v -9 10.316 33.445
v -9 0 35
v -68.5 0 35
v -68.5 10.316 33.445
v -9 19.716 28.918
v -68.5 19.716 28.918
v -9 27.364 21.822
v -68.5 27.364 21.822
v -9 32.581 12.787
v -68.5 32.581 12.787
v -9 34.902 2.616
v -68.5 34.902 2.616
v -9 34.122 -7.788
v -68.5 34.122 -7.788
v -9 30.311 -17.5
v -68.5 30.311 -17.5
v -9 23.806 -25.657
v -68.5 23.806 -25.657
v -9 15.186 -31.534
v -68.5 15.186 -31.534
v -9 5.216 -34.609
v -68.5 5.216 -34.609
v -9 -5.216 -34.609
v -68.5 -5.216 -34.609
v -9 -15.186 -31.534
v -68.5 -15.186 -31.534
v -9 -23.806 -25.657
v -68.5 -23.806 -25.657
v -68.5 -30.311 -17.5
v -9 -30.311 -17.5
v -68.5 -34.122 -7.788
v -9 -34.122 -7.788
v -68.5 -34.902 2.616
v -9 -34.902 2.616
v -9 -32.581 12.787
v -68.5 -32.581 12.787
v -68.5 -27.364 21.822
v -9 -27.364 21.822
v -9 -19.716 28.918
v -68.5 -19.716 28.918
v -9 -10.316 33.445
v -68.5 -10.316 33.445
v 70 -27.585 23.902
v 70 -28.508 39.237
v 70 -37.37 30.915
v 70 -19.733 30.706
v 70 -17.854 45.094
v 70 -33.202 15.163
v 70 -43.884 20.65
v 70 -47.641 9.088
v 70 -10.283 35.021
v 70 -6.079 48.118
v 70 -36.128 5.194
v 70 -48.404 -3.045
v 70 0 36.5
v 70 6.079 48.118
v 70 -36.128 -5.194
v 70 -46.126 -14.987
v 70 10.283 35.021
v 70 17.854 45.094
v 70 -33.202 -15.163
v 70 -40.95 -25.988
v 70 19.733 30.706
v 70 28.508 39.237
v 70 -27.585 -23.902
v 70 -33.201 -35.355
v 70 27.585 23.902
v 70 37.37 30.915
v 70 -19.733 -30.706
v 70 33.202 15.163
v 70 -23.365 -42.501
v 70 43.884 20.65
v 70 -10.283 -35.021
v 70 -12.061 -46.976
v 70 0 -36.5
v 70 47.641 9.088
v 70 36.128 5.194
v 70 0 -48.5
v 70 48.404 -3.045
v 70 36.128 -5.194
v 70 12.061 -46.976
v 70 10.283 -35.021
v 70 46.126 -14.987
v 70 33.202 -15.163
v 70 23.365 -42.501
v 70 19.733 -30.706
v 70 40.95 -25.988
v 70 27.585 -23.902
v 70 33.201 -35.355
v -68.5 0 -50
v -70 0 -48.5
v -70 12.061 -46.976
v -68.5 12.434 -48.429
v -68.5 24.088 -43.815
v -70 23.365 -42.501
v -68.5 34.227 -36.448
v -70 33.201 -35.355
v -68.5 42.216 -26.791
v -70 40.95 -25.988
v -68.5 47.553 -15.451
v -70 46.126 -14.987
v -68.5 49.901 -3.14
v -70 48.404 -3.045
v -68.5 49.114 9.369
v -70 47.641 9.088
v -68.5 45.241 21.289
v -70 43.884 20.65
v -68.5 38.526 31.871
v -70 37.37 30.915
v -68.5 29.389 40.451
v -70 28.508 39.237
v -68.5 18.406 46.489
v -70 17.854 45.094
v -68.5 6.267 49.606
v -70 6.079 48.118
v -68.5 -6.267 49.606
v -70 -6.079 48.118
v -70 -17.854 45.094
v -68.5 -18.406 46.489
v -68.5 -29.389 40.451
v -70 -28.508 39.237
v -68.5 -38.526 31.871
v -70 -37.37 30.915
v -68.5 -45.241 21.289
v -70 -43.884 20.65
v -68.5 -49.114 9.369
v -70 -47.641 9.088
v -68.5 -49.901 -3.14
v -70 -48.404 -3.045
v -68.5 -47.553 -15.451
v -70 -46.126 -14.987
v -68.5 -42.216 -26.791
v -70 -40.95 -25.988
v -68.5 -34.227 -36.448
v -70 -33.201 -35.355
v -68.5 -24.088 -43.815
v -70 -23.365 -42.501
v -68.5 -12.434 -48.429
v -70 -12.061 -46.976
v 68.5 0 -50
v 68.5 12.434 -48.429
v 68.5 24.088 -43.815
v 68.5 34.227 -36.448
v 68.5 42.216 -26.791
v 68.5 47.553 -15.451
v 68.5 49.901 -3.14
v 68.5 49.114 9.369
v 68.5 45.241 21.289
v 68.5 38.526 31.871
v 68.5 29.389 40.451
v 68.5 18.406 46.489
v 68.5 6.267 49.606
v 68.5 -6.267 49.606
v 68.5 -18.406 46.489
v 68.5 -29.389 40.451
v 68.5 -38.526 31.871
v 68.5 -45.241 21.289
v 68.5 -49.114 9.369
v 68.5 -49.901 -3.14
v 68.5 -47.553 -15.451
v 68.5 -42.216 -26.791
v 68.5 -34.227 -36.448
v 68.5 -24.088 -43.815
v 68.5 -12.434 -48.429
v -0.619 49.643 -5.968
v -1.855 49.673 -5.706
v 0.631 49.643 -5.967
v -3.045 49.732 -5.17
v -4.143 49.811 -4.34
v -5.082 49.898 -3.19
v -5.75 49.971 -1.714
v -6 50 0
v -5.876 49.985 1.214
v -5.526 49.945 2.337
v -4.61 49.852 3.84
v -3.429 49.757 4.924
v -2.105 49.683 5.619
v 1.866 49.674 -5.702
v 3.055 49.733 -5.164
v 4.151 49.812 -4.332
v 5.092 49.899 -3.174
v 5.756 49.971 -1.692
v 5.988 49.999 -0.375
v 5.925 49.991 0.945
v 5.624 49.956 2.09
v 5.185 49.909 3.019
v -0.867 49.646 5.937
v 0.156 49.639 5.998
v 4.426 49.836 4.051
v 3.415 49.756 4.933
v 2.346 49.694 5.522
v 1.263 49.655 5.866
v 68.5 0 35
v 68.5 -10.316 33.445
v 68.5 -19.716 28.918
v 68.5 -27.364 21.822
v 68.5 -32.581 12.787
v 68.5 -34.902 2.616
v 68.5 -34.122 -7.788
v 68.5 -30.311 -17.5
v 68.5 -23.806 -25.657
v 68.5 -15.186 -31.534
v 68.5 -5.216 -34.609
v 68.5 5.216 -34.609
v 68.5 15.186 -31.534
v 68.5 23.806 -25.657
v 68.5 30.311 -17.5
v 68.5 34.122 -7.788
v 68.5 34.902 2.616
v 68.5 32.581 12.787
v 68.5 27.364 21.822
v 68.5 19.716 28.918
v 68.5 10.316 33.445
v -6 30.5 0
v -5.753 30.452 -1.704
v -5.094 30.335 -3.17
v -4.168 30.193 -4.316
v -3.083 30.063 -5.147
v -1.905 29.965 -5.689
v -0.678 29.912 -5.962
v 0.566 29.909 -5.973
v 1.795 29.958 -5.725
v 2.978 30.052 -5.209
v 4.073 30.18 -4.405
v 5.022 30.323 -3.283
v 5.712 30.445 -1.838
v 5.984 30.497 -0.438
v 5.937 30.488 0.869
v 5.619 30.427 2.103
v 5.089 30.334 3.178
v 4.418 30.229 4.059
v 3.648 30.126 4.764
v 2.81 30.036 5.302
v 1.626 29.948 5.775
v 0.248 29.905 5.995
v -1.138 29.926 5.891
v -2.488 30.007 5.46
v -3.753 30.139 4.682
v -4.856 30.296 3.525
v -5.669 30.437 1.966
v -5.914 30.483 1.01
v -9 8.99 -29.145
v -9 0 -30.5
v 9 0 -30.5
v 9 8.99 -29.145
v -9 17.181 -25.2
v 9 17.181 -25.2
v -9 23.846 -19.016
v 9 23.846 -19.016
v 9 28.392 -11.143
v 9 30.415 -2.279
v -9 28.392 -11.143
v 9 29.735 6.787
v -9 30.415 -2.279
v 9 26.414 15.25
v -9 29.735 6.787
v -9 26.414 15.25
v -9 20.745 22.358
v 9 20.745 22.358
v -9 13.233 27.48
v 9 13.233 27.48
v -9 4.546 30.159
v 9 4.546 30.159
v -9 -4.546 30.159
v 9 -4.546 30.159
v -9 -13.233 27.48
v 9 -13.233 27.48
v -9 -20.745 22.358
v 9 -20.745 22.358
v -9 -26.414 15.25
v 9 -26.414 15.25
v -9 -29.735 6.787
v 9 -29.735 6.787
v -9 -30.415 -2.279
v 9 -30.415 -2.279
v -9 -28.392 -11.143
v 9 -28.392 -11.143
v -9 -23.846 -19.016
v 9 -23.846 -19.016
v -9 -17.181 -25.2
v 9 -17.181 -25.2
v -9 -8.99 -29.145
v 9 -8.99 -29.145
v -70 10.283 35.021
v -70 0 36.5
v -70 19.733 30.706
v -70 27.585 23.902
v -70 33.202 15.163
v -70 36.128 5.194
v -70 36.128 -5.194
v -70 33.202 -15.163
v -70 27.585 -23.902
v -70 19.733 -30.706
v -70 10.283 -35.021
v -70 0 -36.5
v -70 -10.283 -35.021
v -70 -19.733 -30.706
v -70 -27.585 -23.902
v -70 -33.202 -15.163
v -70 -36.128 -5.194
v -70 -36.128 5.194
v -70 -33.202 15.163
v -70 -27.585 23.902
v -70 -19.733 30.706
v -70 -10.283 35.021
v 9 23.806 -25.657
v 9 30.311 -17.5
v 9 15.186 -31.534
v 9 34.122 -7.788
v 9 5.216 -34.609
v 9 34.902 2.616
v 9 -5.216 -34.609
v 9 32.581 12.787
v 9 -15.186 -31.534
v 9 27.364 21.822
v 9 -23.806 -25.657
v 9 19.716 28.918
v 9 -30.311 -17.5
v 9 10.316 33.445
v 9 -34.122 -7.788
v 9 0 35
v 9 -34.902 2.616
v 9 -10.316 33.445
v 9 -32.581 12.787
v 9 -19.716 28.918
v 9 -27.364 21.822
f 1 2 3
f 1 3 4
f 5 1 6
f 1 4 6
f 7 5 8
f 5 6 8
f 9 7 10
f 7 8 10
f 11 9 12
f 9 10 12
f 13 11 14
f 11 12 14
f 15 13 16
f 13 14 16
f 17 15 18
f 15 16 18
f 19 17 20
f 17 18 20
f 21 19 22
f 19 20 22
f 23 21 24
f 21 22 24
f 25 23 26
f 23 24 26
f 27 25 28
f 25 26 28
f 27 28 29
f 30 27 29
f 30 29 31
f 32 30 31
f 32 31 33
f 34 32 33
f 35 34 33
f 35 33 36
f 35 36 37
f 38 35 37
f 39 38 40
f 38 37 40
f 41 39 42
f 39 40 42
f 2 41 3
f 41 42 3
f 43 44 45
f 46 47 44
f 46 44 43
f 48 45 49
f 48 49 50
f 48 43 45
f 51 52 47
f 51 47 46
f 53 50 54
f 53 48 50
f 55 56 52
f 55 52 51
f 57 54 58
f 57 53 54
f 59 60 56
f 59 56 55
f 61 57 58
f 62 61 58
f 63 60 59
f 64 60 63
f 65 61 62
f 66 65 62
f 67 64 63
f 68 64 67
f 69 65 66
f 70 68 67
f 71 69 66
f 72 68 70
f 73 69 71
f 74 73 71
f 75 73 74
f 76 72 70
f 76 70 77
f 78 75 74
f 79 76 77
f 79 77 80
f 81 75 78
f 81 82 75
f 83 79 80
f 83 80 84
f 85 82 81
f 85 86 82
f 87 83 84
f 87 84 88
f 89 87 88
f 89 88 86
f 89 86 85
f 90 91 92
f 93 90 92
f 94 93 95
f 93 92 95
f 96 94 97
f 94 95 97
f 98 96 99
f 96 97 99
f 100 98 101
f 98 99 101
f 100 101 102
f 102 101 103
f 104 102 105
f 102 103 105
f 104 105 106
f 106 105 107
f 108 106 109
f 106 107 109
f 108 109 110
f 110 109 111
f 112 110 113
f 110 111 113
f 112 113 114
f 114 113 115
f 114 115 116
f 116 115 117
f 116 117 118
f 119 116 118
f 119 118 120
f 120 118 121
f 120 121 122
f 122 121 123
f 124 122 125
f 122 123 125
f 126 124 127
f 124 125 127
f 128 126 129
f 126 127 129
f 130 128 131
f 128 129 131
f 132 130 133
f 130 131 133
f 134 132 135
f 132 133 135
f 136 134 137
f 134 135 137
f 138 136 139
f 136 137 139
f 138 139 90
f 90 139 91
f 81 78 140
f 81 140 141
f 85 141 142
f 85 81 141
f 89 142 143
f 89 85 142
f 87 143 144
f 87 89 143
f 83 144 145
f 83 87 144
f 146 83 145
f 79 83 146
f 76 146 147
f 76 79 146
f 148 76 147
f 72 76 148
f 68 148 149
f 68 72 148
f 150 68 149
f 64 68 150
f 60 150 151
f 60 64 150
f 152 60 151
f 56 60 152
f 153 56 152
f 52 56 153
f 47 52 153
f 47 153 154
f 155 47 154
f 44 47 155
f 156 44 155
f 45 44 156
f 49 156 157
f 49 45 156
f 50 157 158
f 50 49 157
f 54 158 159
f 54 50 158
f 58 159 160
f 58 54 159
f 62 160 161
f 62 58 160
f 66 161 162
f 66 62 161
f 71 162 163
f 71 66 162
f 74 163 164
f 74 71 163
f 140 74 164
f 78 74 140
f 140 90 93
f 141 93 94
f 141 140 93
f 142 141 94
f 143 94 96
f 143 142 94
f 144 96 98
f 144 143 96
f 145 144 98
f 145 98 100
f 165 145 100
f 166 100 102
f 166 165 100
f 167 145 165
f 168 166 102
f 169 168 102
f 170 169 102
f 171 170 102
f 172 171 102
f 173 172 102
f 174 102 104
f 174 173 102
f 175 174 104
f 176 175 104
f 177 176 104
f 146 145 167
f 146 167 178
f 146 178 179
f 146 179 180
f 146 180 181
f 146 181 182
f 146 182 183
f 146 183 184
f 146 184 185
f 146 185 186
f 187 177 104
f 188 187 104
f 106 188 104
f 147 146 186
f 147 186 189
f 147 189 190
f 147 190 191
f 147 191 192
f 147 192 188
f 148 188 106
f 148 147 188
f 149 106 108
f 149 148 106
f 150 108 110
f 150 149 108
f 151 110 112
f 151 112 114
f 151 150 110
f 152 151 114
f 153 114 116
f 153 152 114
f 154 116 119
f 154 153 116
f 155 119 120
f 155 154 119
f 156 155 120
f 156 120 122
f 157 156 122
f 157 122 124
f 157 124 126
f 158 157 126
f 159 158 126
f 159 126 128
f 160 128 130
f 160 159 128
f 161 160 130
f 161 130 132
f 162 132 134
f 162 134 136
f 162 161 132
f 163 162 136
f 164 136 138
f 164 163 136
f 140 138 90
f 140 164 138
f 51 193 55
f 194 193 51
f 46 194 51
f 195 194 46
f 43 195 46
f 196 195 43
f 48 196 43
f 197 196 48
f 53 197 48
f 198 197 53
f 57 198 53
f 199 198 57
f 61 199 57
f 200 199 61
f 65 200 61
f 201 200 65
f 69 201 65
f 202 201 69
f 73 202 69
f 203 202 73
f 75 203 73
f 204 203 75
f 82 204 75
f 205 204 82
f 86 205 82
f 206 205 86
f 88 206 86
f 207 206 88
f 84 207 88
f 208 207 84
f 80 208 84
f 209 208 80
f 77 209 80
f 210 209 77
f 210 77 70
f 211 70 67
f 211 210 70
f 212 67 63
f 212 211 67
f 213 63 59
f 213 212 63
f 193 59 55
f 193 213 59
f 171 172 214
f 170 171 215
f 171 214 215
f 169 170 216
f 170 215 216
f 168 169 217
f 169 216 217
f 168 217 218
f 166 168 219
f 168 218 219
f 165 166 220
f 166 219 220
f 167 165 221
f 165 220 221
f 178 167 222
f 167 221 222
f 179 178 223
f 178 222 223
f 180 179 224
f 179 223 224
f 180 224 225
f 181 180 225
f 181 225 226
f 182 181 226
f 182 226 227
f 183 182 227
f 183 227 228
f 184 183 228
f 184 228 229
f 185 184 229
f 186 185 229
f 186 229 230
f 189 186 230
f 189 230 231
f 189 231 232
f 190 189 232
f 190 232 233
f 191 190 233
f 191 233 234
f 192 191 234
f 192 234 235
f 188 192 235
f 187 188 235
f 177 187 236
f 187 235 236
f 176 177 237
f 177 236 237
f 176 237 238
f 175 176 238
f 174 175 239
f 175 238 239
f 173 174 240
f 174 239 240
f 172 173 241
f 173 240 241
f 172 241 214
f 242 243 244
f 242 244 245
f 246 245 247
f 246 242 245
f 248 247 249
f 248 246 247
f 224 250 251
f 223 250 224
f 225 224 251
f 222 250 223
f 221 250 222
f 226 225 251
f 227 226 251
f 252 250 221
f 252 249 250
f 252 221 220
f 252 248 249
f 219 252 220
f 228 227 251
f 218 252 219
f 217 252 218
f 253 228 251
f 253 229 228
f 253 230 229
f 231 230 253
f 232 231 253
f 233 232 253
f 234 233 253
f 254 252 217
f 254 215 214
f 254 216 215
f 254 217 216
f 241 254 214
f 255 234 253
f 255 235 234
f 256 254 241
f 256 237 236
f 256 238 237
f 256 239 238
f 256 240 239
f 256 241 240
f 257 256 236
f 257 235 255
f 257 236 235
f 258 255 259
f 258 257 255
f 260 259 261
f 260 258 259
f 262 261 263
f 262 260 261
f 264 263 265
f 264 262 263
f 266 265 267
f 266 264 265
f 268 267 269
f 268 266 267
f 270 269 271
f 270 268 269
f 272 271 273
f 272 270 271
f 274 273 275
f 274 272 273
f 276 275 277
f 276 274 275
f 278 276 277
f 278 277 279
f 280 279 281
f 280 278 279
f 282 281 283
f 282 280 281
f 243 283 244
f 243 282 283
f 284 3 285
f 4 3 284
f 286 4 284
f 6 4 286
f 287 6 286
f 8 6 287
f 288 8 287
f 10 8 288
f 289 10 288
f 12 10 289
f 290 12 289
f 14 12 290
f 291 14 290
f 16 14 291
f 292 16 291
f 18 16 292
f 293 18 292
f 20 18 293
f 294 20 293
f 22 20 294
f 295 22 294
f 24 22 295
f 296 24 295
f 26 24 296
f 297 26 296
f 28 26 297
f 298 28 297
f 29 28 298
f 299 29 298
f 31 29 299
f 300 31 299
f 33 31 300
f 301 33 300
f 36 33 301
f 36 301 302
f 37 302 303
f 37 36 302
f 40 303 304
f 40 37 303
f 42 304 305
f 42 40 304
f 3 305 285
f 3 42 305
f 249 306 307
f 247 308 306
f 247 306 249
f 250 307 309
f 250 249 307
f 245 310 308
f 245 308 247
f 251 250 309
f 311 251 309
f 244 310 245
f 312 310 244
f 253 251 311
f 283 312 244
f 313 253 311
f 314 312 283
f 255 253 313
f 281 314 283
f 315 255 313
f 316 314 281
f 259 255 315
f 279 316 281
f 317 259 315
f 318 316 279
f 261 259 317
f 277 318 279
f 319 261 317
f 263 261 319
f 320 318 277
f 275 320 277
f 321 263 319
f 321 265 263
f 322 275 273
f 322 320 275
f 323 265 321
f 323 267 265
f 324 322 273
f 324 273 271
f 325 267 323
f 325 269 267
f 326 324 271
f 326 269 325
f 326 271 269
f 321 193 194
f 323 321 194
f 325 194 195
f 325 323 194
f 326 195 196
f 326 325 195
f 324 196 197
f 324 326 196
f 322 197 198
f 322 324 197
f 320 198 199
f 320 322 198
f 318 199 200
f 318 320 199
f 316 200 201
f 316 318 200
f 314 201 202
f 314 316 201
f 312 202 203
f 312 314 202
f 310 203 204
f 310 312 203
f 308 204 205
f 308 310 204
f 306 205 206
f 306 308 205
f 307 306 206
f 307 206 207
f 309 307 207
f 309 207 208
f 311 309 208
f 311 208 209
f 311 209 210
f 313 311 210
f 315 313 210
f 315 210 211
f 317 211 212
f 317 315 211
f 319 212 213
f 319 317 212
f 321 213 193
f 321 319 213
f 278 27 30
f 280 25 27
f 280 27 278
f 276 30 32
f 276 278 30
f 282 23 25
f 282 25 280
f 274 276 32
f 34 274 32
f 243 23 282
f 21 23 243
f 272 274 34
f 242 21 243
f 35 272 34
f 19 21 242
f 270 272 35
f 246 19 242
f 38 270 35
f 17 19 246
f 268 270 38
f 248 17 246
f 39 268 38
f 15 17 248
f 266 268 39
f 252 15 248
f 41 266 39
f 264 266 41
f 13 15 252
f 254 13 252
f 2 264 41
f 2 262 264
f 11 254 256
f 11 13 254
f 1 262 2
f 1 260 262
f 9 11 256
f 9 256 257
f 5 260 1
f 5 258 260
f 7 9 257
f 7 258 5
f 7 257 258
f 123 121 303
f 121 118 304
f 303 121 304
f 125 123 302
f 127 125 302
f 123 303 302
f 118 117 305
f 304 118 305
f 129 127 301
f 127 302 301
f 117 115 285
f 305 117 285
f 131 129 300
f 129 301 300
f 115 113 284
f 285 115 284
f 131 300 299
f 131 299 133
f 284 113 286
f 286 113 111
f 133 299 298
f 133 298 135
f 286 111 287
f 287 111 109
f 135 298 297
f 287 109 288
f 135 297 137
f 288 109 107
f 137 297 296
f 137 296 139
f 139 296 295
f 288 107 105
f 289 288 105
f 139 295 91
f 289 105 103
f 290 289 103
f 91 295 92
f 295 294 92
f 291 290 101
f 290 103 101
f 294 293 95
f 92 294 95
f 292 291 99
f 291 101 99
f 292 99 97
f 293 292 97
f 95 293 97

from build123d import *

# Parameters (mm, degrees)
SKETCH_1_R              = 50
SKETCH_1_R_2            = 30.5
EXTRUDE_1_DEPTH         = 70
SKETCH_4_R              = 35
CUT_EXTRUDE_1_DEPTH     = 61
CUT_EXTRUDE_START       = -61
SKETCH_5_R              = 35
CUT_EXTRUDE_2_DEPTH     = 61
CHAMFER_1_SIZE          = 1.5
HOLE_WIZARD_M14_1_D     = 12
HOLE_WIZARD_M14_1_DEPTH = 38
HOLE_WIZARD_M14_1_TIP   = 3.605163714


with BuildPart() as part:
    # 草图1 → 凸台-拉伸1 (new, symmetric)
    with BuildSketch(Plane(origin=(0, 0, 0), x_dir=(0, 0, -1), z_dir=(1, 0, 0))):
        Circle(SKETCH_1_R)
        Circle(SKETCH_1_R_2, mode=Mode.SUBTRACT)
    extrude(amount=EXTRUDE_1_DEPTH, both=True)

    # 草图4 → 切除-拉伸1 (cut)
    with BuildSketch(Plane.ZY.offset(70)):
        Circle(SKETCH_4_R)
    extrude(amount=-CUT_EXTRUDE_1_DEPTH, mode=Mode.SUBTRACT)

    # 草图5 → 切除-拉伸2 (cut)
    with BuildSketch(Plane(origin=(70, 0, 0), x_dir=(0, 0, -1), z_dir=(1, 0, 0)).offset(CUT_EXTRUDE_START)):
        with Locations(Location((0, 0, 0), (0, 0, 180))):
            Circle(SKETCH_5_R)
    extrude(amount=CUT_EXTRUDE_2_DEPTH, mode=Mode.SUBTRACT)

    # 倒角1
    chamfer_1_edges = [part.edges().sort_by_distance(p)[0] for p in [
        (-70, 0, -35),
        (70, 0, -35),
        (-70, 0, 50),
        (70, 0, 50),
    ]]
    chamfer(chamfer_1_edges, length=CHAMFER_1_SIZE)

    # M14 螺纹孔1
    with Locations(Plane(origin=(0, 50, 0), x_dir=(1, 0, 0), z_dir=(0, 1, 0))):
        with Locations((0, 0)):
            Hole(HOLE_WIZARD_M14_1_D / 2, depth=HOLE_WIZARD_M14_1_DEPTH)
            with Locations((0, 0, -(HOLE_WIZARD_M14_1_DEPTH + HOLE_WIZARD_M14_1_TIP / 2))):  # 118° drill point
                Cone(0, HOLE_WIZARD_M14_1_D / 2, HOLE_WIZARD_M14_1_TIP, mode=Mode.SUBTRACT)


solid = part.part
